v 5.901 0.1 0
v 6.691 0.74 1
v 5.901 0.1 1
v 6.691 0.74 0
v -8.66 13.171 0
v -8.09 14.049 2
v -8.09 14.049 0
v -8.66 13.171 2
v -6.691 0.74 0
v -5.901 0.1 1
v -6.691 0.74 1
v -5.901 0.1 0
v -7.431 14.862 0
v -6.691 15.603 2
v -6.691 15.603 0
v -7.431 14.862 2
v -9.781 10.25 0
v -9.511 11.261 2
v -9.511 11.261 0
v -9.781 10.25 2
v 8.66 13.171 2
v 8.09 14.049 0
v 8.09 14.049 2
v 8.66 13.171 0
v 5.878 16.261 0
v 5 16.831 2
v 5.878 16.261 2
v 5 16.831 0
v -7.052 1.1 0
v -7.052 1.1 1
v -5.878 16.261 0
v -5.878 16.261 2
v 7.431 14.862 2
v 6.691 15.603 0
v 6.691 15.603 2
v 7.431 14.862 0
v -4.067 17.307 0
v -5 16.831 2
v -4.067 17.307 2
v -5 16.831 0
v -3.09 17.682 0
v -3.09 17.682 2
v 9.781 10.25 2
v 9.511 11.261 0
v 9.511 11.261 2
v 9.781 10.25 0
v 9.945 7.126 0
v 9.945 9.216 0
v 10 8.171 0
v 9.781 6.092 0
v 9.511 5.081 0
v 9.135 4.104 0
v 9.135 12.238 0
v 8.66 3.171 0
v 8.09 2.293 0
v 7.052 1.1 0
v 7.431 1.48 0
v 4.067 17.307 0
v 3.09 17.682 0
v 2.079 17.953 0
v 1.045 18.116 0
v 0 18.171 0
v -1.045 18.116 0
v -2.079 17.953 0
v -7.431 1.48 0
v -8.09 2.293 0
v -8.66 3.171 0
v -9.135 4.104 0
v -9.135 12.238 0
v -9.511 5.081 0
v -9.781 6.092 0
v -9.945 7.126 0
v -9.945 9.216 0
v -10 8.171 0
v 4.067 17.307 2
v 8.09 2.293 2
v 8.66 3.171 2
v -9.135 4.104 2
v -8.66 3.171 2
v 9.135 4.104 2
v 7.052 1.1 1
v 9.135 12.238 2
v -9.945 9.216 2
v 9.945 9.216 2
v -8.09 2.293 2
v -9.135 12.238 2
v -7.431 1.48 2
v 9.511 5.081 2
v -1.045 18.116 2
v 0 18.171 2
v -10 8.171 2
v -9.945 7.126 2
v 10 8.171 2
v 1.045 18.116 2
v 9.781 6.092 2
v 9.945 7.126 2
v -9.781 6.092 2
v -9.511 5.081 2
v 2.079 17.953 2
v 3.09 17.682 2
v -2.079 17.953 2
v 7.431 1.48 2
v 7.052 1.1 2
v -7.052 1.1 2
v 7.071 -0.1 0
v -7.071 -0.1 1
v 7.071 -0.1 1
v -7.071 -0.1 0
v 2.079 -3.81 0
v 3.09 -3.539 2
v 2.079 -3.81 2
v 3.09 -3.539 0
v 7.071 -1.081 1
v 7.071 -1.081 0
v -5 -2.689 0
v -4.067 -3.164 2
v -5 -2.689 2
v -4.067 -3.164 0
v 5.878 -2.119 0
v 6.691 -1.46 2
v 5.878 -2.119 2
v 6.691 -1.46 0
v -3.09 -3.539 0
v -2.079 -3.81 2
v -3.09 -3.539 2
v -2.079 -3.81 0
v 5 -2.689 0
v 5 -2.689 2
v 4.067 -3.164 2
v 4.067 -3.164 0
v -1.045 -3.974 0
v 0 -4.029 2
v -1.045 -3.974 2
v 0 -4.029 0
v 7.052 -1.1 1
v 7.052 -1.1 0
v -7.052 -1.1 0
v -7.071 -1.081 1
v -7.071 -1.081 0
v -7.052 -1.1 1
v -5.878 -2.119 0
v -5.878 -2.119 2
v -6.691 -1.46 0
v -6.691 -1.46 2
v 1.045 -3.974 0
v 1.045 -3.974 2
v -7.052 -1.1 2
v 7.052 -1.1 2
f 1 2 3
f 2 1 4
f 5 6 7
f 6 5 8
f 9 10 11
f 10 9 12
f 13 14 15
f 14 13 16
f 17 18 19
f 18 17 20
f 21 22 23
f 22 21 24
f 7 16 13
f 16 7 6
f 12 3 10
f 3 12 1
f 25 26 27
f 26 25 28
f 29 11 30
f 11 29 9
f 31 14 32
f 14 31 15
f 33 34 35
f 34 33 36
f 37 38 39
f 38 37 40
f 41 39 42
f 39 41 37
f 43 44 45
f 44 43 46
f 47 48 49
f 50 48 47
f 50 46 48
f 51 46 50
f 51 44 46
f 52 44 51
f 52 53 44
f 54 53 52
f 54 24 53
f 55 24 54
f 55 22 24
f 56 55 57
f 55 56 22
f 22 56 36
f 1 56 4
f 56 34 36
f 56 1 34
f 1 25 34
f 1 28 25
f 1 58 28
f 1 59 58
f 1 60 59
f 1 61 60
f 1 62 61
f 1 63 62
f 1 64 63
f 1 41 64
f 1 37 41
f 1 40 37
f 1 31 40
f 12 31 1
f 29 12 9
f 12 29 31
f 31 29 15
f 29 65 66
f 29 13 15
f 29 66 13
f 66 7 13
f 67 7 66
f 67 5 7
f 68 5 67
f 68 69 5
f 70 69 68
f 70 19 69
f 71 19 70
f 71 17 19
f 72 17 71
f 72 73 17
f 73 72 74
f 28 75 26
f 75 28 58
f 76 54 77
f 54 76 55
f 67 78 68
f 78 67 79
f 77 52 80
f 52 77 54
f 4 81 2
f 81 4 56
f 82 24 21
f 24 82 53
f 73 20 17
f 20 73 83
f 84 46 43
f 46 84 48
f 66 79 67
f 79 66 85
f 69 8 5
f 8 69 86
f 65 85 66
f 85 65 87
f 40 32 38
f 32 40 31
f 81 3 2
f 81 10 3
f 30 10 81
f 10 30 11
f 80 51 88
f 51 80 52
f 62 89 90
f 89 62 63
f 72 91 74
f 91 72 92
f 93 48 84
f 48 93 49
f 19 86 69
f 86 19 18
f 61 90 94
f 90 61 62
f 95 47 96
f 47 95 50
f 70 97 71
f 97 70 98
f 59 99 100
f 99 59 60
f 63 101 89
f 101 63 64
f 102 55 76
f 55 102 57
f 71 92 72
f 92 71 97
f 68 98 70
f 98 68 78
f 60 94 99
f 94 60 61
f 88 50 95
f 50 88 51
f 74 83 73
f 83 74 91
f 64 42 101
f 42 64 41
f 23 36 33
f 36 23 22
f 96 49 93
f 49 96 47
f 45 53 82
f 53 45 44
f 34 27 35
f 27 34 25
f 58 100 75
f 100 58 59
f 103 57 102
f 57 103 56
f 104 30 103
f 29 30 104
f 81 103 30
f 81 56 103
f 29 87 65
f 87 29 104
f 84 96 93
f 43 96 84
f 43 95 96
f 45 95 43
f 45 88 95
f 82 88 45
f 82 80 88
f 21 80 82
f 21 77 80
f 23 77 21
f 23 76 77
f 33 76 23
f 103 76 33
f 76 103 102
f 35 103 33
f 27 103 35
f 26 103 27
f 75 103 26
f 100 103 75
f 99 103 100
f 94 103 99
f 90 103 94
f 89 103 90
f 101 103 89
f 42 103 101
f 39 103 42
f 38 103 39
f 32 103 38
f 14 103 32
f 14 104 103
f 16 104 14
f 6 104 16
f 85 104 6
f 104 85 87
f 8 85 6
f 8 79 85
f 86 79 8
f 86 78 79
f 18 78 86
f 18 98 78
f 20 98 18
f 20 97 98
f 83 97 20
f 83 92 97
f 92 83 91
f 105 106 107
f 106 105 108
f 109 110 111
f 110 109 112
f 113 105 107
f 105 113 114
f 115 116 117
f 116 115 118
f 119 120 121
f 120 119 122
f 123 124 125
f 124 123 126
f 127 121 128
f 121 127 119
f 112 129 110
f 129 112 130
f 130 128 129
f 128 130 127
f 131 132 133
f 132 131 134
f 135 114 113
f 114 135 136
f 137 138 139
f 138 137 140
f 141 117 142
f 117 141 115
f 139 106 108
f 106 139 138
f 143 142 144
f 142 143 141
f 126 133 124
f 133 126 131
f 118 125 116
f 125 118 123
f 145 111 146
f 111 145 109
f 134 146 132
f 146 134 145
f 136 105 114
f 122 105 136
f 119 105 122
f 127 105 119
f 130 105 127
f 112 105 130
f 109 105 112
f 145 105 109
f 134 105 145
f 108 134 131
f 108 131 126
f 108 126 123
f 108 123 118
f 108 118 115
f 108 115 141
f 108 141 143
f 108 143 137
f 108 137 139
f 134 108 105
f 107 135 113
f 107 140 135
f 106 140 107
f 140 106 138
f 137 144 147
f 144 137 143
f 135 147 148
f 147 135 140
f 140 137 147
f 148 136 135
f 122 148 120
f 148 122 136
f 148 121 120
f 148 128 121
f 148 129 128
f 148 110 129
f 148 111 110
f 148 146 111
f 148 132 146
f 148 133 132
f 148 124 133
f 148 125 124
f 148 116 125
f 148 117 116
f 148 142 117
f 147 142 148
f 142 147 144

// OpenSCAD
// Unit of length: Unit.MM
$fn = 60;
$vpr = [0.0, 0.0, 0.0];

union()
{
   translate(v = [0.0, 1.1])
   {
      union()
      {
         color(c = [1.0, 0.0, 0.0, 1.0])
         {
            linear_extrude(height = 1.0, center = false, twist = 0.0, scale = 1.0)
            {
               translate(v = [0.0, 7.0711])
               {
                  intersection()
                  {
                     circle(d = 20.0);
                     polygon(points = [[-10.0, -8.0711], [-10.0, 10.0], [10.0, 10.0], [10.0, -8.0711]]);
                  }
               }
            }
         }
         translate(v = [0.0, 0.0, 0.0])
         {
            linear_extrude(height = 2.0, center = false, twist = 0.0, scale = 1.0)
            {
               translate(v = [0.0, 7.0711])
               {
                  intersection()
                  {
                     circle(d = 20.0);
                     polygon(points = [[-10.0, -7.0711], [-10.0, 10.0], [10.0, 10.0], [10.0, -7.0711]]);
                  }
               }
            }
         }
      }
   }
   translate(v = [0.0, -1.1])
   {
      union()
      {
         color(c = [1.0, 0.0, 0.0, 1.0])
         {
            linear_extrude(height = 1.0, center = false, twist = 0.0, scale = 1.0)
            {
               translate(v = [0.0, 7.0711])
               {
                  intersection()
                  {
                     circle(d = 20.0);
                     polygon(points = [[-7.0711, -10.0], [-7.0711, -6.0711], [7.0711, -6.0711], [7.0711, -10.0]]);
                  }
               }
            }
         }
         translate(v = [0.0, 0.0, 0.0])
         {
            linear_extrude(height = 2.0, center = false, twist = 0.0, scale = 1.0)
            {
               translate(v = [0.0, 7.0711])
               {
                  intersection()
                  {
                     circle(d = 20.0);
                     polygon(points = [[-7.0711, -10.0], [-7.0711, -7.0711], [7.0711, -7.0711], [7.0711, -10.0]]);
                  }
               }
            }
         }
      }
   }
}
